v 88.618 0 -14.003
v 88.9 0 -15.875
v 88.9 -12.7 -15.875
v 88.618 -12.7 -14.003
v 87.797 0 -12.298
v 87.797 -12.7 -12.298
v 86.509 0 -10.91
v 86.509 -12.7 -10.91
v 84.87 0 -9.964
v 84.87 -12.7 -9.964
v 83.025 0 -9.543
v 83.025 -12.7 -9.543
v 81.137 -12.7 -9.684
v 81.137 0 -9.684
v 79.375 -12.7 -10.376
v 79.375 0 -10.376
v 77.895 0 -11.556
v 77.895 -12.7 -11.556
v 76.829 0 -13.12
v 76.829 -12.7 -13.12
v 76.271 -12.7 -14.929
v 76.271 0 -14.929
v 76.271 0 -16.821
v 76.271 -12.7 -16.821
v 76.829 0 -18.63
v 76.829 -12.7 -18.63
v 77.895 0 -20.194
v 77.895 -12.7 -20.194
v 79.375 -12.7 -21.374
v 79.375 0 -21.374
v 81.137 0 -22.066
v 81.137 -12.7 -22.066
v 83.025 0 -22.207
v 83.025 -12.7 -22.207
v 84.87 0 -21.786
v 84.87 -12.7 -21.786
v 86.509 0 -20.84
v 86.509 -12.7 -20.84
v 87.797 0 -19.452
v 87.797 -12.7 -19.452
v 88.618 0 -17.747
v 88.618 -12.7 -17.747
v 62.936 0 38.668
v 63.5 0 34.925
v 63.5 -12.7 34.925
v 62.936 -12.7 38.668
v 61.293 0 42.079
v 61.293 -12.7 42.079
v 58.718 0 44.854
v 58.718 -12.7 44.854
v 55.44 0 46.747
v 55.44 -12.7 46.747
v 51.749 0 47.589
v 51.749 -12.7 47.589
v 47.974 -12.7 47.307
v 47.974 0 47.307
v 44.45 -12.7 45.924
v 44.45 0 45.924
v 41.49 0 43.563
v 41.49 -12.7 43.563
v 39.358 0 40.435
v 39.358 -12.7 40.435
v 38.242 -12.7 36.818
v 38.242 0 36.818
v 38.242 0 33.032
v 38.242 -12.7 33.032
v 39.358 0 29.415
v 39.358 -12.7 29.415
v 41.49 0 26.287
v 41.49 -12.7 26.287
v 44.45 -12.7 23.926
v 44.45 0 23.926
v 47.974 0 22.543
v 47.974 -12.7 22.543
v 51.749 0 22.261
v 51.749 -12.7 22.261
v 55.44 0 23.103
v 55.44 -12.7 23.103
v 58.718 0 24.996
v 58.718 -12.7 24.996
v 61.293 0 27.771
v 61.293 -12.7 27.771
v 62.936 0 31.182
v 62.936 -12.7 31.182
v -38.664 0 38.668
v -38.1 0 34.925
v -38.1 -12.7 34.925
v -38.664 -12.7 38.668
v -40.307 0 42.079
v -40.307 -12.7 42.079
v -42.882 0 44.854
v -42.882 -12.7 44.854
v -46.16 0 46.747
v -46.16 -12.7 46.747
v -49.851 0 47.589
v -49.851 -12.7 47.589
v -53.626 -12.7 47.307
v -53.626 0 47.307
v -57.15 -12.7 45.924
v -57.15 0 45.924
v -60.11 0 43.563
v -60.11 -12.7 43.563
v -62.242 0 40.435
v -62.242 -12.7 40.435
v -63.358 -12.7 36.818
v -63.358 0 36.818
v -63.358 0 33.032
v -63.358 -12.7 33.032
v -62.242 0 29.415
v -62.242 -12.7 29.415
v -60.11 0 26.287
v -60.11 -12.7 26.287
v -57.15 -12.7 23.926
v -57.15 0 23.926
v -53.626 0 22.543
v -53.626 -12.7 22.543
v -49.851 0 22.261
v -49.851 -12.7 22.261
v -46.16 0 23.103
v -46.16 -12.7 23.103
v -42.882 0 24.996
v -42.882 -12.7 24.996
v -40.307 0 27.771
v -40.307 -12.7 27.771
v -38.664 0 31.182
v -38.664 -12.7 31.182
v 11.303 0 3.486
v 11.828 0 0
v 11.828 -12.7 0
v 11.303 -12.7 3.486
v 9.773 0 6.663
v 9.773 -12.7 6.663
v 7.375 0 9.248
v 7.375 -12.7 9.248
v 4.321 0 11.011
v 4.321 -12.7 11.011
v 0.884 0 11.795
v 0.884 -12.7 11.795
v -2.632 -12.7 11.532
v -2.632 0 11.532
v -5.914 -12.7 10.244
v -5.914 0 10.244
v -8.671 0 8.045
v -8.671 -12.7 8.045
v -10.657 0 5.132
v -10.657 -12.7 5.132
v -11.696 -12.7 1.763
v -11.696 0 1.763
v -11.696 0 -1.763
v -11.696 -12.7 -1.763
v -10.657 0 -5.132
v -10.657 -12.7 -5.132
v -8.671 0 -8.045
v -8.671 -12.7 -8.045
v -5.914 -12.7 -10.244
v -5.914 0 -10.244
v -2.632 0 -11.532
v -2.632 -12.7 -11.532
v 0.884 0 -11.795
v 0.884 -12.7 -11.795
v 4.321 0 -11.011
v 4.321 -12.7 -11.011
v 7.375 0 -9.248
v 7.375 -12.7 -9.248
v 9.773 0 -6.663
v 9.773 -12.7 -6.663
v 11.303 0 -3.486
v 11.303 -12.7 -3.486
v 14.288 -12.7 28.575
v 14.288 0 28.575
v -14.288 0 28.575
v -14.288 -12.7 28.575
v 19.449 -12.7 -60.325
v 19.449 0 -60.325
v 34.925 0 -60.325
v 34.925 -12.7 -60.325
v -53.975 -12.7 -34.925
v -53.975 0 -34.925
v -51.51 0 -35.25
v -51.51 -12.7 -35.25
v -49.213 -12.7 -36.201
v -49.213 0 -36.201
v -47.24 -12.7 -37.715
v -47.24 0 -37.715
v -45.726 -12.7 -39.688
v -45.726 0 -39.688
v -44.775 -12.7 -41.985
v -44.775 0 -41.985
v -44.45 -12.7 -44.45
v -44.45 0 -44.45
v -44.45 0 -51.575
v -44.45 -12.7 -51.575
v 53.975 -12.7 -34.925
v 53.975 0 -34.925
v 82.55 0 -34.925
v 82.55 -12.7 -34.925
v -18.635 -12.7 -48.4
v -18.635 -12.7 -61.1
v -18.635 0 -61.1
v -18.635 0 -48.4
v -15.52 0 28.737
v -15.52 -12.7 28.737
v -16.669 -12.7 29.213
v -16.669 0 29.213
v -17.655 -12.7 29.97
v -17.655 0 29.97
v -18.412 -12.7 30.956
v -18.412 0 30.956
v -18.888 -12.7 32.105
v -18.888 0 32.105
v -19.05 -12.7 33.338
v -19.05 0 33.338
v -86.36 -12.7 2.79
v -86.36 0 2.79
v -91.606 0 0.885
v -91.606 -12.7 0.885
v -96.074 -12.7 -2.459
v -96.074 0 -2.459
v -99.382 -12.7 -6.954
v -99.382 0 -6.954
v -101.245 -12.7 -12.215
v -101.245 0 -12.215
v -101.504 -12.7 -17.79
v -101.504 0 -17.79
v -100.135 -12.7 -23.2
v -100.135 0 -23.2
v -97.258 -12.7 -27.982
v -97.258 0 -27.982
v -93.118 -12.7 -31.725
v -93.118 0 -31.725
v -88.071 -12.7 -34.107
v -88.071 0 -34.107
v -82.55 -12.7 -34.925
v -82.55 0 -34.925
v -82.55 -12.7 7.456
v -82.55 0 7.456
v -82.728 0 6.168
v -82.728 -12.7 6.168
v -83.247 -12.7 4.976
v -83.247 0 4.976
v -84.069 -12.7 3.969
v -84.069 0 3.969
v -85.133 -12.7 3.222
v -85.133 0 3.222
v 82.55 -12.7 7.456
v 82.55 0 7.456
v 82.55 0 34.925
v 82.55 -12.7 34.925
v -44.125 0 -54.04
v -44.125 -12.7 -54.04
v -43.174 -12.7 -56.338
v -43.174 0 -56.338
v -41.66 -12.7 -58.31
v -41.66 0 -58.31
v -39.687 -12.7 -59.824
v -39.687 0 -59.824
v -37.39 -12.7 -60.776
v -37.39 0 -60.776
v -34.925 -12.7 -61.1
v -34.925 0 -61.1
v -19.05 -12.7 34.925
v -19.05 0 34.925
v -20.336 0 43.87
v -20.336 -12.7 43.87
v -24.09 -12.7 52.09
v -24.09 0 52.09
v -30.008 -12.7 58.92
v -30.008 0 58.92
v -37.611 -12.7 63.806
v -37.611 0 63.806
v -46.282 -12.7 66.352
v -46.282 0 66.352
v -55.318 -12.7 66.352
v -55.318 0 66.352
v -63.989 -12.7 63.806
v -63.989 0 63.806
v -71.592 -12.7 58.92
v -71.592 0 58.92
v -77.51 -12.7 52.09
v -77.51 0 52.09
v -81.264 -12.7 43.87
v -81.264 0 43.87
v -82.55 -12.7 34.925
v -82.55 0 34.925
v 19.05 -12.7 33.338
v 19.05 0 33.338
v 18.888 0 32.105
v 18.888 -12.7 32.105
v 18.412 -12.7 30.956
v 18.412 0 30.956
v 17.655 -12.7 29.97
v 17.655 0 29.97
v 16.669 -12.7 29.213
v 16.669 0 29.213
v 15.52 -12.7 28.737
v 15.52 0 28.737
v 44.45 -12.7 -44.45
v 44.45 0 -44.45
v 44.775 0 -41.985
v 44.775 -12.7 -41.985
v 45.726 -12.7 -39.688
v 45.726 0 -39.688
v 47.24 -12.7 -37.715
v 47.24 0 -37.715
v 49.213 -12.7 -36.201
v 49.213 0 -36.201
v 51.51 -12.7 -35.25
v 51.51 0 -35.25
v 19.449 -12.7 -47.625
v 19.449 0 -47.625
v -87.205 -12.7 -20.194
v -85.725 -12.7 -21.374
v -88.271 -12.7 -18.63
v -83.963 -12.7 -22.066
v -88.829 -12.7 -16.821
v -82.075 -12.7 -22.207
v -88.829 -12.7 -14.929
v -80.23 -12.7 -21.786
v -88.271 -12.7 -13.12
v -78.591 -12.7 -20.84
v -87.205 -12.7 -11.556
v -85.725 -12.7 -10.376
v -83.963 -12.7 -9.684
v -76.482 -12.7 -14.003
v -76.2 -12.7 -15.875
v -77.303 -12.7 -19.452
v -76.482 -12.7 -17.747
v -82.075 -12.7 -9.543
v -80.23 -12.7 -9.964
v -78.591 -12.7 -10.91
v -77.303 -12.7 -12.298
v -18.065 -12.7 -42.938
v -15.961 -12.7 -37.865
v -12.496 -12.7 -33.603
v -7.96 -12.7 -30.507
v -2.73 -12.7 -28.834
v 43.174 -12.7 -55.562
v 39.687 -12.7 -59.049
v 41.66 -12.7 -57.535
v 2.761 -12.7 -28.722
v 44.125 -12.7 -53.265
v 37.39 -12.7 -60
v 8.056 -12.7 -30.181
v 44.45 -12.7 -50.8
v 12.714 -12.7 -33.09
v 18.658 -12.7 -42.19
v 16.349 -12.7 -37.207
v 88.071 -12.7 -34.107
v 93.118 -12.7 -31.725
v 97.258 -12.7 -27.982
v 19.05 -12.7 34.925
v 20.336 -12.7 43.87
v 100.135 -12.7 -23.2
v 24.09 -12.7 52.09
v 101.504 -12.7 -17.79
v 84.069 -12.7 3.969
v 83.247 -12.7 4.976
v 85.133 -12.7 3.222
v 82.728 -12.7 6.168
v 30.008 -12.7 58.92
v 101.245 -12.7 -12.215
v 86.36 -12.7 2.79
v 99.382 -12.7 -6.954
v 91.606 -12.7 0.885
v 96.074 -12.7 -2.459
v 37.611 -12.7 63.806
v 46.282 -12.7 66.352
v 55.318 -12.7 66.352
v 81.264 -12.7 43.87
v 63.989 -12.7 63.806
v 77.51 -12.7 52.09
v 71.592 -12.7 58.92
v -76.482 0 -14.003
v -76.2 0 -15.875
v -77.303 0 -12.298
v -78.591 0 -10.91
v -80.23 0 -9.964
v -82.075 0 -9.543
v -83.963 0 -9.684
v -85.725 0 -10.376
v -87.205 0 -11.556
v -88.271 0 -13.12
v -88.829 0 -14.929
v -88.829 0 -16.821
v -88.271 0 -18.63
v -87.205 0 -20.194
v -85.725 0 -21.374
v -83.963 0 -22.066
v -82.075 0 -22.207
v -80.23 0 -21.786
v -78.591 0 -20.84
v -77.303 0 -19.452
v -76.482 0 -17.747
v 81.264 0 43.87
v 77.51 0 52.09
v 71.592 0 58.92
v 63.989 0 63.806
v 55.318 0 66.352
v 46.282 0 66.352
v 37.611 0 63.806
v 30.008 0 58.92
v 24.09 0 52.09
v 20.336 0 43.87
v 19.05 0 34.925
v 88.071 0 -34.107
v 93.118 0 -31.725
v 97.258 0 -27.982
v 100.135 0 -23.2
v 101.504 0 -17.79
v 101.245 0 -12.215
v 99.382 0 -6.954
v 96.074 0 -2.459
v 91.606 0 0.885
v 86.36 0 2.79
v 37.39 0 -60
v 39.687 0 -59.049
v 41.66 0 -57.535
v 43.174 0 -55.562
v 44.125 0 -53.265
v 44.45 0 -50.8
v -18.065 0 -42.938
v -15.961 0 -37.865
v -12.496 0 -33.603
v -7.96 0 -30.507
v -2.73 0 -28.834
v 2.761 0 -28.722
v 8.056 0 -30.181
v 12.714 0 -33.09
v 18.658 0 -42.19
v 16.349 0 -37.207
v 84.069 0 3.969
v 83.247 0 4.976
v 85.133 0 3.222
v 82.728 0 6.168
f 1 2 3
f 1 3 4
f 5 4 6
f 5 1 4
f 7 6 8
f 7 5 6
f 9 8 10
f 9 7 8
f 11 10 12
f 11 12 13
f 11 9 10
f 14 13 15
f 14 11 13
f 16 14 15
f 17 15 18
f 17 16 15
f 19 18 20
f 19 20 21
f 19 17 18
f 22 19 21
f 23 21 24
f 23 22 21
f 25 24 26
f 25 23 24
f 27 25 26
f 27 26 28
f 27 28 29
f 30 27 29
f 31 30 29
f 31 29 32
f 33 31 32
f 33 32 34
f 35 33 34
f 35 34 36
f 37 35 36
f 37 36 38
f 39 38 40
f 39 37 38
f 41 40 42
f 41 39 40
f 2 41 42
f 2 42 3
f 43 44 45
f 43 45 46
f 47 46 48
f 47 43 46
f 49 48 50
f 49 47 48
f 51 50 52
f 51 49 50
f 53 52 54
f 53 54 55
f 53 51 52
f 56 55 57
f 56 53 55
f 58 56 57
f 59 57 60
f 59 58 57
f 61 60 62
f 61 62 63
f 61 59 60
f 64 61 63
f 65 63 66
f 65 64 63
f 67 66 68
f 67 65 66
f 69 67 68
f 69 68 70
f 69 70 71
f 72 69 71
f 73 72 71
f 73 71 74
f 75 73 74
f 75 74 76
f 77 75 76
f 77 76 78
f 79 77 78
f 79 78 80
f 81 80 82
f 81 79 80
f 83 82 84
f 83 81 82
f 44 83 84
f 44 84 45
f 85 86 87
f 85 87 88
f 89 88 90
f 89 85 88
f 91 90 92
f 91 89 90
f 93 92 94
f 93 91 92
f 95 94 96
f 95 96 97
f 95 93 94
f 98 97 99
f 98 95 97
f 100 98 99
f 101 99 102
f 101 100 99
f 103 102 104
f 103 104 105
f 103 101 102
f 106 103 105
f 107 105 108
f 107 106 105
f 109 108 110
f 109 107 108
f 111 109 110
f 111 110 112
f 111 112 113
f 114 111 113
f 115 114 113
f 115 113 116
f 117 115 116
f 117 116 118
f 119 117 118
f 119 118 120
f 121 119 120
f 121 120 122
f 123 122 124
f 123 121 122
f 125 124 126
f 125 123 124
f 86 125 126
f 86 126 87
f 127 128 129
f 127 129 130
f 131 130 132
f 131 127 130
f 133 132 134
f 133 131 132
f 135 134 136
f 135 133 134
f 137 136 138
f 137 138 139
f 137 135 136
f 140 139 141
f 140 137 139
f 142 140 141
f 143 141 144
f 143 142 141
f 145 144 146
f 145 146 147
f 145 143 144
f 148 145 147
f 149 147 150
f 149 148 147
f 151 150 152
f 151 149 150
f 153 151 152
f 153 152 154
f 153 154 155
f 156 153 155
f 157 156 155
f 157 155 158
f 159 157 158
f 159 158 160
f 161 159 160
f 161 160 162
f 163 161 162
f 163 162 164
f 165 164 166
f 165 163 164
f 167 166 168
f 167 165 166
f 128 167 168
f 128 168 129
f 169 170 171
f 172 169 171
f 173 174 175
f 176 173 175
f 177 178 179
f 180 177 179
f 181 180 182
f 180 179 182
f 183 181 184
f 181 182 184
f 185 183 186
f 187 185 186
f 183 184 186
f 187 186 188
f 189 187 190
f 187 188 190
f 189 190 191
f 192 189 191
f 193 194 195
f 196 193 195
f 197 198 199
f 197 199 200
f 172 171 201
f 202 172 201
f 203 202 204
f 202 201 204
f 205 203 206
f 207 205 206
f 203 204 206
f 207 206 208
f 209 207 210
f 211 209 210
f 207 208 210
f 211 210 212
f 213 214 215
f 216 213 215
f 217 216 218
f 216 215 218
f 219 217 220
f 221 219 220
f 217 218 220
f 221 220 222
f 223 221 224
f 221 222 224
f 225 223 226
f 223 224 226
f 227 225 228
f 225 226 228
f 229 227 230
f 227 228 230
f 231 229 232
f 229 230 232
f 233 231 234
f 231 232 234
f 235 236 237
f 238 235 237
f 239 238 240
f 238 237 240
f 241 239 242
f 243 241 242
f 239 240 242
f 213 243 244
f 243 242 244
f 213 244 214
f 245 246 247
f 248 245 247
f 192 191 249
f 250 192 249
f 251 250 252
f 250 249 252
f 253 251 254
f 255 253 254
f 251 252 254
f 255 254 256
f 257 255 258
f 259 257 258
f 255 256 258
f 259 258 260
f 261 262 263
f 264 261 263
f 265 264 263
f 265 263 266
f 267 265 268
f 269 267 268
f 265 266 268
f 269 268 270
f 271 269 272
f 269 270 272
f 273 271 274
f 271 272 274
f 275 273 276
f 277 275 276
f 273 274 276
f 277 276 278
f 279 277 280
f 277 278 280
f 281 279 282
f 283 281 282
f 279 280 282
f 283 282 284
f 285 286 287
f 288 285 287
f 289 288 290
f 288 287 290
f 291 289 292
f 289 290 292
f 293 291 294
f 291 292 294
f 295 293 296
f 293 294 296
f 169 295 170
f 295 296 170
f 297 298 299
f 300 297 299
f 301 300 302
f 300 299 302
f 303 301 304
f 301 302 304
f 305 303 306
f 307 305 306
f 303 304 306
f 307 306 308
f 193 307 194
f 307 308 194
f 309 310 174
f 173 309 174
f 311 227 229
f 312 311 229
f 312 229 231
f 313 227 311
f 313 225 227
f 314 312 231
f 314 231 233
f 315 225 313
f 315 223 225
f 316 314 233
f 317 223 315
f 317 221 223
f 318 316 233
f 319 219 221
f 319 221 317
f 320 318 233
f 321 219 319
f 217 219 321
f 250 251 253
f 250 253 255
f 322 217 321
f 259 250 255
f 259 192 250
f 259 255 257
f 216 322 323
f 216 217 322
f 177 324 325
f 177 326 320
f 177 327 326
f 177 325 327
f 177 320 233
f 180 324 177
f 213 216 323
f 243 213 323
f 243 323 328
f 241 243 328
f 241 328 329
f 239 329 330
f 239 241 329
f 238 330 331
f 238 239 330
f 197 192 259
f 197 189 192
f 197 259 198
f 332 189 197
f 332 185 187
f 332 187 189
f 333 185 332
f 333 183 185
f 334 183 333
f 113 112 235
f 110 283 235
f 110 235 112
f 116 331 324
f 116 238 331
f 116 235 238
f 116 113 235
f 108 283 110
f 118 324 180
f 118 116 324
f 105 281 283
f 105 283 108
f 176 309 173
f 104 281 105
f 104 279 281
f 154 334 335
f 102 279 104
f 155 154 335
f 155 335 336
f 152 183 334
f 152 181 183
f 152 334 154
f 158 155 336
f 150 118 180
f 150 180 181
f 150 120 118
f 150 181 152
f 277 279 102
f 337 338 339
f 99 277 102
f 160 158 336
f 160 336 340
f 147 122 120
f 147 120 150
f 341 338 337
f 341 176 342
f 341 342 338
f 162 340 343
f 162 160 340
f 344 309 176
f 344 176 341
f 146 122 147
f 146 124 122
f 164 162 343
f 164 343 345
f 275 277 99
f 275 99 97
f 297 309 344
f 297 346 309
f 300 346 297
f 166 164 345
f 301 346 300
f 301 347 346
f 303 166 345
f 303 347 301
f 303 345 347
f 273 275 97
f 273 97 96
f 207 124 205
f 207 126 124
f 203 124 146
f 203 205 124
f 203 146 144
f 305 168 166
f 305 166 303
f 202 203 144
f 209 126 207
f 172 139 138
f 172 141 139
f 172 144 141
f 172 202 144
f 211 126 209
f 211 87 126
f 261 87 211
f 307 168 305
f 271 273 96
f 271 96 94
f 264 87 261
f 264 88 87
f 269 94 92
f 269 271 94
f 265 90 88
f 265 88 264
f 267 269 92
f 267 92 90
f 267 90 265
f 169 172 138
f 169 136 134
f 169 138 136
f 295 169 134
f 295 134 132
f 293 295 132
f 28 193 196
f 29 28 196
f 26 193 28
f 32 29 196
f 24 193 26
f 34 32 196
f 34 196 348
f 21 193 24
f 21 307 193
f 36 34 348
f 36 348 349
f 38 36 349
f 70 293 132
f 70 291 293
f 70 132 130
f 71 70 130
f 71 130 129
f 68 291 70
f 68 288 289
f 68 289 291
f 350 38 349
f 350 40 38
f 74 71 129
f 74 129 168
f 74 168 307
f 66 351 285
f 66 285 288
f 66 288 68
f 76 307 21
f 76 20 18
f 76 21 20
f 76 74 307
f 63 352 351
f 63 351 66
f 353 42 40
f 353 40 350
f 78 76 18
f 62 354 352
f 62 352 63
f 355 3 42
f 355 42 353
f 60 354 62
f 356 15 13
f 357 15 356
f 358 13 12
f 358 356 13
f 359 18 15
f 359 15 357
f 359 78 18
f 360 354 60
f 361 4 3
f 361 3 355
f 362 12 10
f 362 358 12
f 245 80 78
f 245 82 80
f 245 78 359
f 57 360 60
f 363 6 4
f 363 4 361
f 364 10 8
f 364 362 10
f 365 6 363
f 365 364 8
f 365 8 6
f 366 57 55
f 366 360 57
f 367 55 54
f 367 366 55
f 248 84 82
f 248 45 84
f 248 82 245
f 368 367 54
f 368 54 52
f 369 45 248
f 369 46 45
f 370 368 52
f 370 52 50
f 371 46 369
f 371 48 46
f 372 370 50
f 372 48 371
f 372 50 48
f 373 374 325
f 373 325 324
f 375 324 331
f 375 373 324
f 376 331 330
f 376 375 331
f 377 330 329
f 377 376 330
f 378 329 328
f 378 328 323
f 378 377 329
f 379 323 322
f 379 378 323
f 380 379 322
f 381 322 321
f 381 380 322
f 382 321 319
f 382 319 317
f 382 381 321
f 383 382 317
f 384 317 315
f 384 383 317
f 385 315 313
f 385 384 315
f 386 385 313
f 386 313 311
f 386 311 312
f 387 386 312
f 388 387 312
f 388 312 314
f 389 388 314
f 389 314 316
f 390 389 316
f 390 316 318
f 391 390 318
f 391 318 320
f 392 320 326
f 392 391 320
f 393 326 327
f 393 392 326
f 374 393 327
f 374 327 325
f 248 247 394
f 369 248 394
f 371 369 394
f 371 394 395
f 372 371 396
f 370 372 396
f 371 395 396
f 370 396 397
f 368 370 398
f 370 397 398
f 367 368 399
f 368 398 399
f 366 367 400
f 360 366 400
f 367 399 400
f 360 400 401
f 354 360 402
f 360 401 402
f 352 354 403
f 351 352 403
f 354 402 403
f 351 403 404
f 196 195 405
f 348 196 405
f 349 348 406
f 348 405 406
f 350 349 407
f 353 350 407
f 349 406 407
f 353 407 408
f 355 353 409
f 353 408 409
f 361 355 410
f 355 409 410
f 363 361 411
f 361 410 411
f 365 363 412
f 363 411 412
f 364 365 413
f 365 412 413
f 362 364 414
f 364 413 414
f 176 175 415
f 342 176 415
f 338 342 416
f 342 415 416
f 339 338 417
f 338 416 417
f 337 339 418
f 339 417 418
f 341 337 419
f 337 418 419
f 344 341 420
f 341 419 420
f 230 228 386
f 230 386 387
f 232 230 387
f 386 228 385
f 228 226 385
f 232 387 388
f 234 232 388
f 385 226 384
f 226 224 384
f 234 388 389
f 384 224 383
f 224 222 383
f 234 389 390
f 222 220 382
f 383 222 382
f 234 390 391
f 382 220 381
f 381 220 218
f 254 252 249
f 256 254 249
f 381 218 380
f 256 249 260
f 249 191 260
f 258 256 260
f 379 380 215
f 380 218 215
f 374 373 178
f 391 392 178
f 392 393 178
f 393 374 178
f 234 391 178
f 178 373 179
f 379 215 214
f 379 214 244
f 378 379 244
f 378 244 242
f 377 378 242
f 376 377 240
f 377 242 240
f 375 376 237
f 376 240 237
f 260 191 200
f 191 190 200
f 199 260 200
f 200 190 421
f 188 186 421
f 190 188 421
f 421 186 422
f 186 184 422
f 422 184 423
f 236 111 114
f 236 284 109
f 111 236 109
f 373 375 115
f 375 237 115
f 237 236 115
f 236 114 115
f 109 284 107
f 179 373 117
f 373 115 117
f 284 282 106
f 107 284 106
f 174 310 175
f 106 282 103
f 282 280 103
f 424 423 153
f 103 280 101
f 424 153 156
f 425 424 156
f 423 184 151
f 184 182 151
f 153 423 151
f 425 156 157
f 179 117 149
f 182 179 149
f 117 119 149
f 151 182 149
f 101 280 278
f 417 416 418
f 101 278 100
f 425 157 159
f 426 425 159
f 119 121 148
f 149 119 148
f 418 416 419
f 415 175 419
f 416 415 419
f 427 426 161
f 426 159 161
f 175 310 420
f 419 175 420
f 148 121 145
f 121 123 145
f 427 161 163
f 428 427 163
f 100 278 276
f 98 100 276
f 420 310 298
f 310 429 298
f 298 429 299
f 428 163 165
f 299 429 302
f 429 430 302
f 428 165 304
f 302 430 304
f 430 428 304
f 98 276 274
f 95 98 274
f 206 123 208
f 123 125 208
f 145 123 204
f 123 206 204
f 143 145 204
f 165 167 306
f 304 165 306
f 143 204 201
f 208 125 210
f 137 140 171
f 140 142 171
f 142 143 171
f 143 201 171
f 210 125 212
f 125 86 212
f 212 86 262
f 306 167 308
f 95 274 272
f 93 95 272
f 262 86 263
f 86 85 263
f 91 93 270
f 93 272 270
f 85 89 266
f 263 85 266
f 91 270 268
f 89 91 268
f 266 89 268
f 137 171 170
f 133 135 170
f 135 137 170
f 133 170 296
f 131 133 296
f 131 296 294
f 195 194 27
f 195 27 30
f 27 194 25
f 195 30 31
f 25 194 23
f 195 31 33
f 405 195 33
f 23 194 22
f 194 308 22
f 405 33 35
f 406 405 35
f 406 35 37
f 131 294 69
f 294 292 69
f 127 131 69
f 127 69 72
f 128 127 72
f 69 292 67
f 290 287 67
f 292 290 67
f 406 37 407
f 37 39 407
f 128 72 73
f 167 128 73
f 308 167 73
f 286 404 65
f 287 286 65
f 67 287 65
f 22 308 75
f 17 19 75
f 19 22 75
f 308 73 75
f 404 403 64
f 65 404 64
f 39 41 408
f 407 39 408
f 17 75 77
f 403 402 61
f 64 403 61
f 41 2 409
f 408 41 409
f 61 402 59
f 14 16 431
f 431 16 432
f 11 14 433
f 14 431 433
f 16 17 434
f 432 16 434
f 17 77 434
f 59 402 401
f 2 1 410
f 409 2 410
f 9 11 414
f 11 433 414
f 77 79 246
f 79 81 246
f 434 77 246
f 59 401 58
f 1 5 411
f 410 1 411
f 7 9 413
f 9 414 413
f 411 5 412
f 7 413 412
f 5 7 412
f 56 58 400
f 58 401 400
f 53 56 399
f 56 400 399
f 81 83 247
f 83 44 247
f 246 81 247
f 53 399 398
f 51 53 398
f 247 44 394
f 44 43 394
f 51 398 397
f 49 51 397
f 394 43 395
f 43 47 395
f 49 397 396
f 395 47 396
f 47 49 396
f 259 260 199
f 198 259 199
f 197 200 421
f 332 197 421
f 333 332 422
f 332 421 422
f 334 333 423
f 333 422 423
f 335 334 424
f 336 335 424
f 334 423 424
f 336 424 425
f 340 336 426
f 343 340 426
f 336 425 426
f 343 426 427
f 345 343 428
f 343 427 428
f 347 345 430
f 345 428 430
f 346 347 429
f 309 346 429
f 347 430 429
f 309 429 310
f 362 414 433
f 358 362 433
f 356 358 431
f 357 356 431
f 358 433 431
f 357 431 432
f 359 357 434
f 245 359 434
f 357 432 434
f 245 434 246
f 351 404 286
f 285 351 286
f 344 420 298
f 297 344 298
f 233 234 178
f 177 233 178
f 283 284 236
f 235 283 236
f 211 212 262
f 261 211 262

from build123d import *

# Parameters (mm, degrees)
F0_R     = 7.9375
F0_R_2   = 11.828435
F0_R_3   = 12.7
F0_R_4   = 6.35
F1_DEPTH = 12.7


with BuildPart() as f1:
    # F0 (on Front) → F1 (new body)
    with BuildSketch(Plane.XZ):
        with BuildLine():
            Line((82.55, 7.45639), (82.55, 34.925))
            ThreePointArc((82.55, 34.925), (50.8, 66.675), (19.05, 34.925))
            Line((19.05, 34.925), (19.05, 33.3375))
            ThreePointArc((19.05, 33.3375), (17.655096, 29.969904), (14.2875, 28.575))
            Line((14.2875, 28.575), (-14.2875, 28.575))
            ThreePointArc((-14.2875, 28.575), (-17.655096, 29.969904), (-19.05, 33.3375))
            Line((-19.05, 33.3375), (-19.05, 34.925))
            ThreePointArc((-19.05, 34.925), (-50.8, 66.675), (-82.55, 34.925))
            Line((-82.55, 34.925), (-82.55, 7.45639))
            ThreePointArc((-82.55, 7.45639), (-83.623483, 4.44432), (-86.36, 2.790112))
            ThreePointArc((-86.36, 2.790112), (-101.503534, -17.789696), (-82.55, -34.925))
            Line((-82.55, -34.925), (-53.975, -34.925))
            ThreePointArc((-53.975, -34.925), (-47.239808, -37.714808), (-44.45, -44.45))
            Line((-44.45, -44.45), (-44.45, -51.575074))
            ThreePointArc((-44.45, -51.575074), (-41.660192, -58.310266), (-34.925, -61.100074))
            Line((-34.925, -61.100074), (-18.634955, -61.100074))
            Line((-18.634955, -61.100074), (-18.634955, -48.400074))
            ThreePointArc((-18.634955, -48.400074), (0.011654, -28.578944), (19.449271, -47.625))
            Line((19.449271, -47.625), (19.449271, -60.325))
            Line((19.449271, -60.325), (34.925, -60.325))
            ThreePointArc((34.925, -60.325), (41.660192, -57.535192), (44.45, -50.8))
            Line((44.45, -50.8), (44.45, -44.45))
            ThreePointArc((44.45, -44.45), (47.239808, -37.714808), (53.975, -34.925))
            Line((53.975, -34.925), (82.55, -34.925))
            ThreePointArc((82.55, -34.925), (101.503534, -17.789696), (86.36, 2.790112))
            ThreePointArc((86.36, 2.790112), (83.623483, 4.44432), (82.55, 7.45639))
        make_face()
        with Locations((-82.55, -15.875)):
            Circle(F0_R, mode=Mode.SUBTRACT)
        Circle(F0_R_2, mode=Mode.SUBTRACT)
        with Locations((82.55, -15.875)):
            Circle(F0_R, mode=Mode.SUBTRACT)
        with Locations((-50.8, 34.925)):
            Circle(F0_R_3, mode=Mode.SUBTRACT)
        with Locations((50.8, 34.925)):
            Circle(F0_R_3, mode=Mode.SUBTRACT)
        with Locations((-82.55, -15.875)):
            Circle(F0_R)
        with Locations((-82.55, -15.875)):
            Circle(F0_R_4, mode=Mode.SUBTRACT)
        with Locations((82.55, -15.875)):
            Circle(F0_R)
        with Locations((82.55, -15.875)):
            Circle(F0_R_4, mode=Mode.SUBTRACT)
    extrude(amount=F1_DEPTH)


solid = f1.part
